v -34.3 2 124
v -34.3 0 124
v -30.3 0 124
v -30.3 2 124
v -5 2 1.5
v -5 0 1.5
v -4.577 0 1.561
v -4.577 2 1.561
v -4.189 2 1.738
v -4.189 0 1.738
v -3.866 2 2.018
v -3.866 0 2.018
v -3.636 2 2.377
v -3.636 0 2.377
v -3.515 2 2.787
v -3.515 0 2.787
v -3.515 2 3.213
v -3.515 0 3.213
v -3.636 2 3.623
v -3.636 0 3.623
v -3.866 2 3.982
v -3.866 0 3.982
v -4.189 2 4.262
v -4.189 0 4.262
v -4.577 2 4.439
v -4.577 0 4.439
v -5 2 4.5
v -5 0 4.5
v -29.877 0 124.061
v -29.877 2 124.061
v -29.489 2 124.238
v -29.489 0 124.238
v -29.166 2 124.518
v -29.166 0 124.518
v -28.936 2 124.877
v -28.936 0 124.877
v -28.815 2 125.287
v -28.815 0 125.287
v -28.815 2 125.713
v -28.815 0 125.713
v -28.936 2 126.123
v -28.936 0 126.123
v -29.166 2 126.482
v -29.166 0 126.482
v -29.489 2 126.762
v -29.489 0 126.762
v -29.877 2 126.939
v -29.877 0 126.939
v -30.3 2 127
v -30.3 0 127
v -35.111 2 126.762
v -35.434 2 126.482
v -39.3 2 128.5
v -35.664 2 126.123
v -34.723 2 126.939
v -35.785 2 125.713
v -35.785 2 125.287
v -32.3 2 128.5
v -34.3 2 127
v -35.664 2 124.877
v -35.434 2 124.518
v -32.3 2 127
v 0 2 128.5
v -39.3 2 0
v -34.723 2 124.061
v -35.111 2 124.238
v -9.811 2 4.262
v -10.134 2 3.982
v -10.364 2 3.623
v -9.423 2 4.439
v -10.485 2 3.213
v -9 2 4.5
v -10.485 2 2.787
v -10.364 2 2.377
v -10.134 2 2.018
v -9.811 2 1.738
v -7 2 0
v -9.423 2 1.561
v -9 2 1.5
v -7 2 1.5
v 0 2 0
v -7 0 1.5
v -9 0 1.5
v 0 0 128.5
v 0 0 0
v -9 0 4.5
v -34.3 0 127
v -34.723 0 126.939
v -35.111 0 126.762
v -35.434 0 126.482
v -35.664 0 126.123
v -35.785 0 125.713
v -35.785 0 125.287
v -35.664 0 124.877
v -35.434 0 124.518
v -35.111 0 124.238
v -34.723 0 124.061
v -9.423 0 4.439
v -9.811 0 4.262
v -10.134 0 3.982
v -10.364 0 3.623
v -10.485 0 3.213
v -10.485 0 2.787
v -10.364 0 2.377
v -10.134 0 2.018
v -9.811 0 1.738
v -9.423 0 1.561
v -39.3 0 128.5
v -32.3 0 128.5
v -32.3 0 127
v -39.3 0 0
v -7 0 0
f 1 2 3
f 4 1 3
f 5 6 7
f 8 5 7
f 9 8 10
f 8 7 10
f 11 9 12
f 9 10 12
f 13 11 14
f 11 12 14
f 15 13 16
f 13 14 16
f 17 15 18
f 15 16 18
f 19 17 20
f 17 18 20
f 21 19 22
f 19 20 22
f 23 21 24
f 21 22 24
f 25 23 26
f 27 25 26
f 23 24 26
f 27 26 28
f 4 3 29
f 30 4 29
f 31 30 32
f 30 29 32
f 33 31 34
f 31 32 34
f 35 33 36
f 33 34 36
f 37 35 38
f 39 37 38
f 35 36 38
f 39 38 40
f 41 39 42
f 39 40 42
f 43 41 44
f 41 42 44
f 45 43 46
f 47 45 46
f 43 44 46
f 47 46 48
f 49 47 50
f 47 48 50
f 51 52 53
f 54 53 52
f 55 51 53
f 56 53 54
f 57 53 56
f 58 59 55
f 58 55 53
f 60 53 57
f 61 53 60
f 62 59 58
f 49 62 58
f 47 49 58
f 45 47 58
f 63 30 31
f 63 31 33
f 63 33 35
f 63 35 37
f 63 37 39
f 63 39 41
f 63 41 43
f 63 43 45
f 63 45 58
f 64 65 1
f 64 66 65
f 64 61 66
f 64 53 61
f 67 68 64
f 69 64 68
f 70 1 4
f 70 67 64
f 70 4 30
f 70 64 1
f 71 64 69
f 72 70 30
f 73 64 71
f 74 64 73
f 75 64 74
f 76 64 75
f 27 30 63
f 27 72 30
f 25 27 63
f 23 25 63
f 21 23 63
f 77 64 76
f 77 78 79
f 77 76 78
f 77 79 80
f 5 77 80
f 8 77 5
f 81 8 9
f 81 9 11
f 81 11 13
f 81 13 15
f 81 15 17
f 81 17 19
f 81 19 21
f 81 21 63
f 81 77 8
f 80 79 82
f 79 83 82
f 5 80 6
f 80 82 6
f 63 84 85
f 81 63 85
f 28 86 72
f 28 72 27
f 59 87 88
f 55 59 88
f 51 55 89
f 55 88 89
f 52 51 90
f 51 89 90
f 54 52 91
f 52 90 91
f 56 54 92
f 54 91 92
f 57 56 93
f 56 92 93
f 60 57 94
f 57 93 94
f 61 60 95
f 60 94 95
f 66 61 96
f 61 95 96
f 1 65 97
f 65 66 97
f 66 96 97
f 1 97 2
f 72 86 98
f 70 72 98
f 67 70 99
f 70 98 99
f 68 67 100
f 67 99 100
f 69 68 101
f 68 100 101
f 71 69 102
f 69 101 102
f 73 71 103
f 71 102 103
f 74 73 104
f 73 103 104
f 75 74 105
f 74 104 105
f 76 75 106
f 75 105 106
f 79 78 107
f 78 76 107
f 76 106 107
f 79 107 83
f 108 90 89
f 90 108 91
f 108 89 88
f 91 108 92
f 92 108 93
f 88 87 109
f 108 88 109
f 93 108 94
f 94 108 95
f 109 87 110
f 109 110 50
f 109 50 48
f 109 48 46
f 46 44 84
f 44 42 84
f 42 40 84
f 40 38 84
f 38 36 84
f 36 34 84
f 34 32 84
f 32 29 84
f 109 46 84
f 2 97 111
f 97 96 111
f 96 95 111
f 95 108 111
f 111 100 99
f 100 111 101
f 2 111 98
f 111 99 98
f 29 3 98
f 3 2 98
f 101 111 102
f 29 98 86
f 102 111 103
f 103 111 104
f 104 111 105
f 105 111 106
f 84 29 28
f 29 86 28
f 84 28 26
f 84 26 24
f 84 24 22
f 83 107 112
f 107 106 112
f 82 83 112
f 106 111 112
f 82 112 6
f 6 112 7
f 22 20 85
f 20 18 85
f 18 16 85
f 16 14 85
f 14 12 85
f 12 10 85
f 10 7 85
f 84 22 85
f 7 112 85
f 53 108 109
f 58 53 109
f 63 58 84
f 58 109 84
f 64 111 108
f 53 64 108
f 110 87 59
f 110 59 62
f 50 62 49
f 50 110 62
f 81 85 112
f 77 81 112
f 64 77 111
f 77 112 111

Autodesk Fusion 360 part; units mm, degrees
sketch "Skizze1" plane through (0, 0, 0) normal (0, 1, 0) x (1, 0, 0)
  line L0 (0, 0) -> (-39.3, 0)
  line L1 (-39.3, 0) -> (-39.3, -128.5)
  line L2 (-39.3, -128.5) -> (0, -128.5)
  line L3 (0, -128.5) -> (0, 0)
  line L4 (0, 0) -> (-7, 0)
  line L5 (-7, 0) -> (-7, -3)
  line L6 (-39.3, -128.5) -> (-32.3, -128.5)
  line L7 (-32.3, -128.5) -> (-32.3, -125.5)
  line L8 (-7, -3) -> (-9, -3)
  line L9 (-7, -3) -> (-5, -3)
  circle A0 centre (-5, -3) radius 1.5
  circle A1 centre (-9, -3) radius 1.5
  line L10 (-9, -3) -> (-9, -1.5)
  line L11 (-9, -1.5) -> (-5, -1.5)
  line L12 (-9, -4.5) -> (-5, -4.5)
  line L13 (-32.3, -125.5) -> (-34.3, -125.5)
  line L14 (-32.3, -125.5) -> (-30.3, -125.5)
  circle A2 centre (-34.3, -125.5) radius 1.5
  circle A3 centre (-30.3, -125.5) radius 1.5
  line L15 (-34.3, -125.5) -> (-34.3, -124)
  line L16 (-30.3, -125.5) -> (-30.3, -124)
  line L17 (-34.3, -124) -> (-30.3, -124)
  line L18 (-34.3, -125.5) -> (-34.3, -127)
  line L19 (-34.3, -127) -> (-30.3, -127)
  line L20 (0, -128.5) -> (-10, -128.5)
  line L21 (-10, -128.5) -> (-10, -16.5842)
  circle A4 centre (-10, -97.2748) radius 3.5
  line L22 (-10, -97.2748) -> (-10, -76.7748)
  circle A5 centre (-10, -76.7748) radius 3.5
  line L23 (-10, -76.7748) -> (-21.5, -76.7748)
  line L24 (-21.5, -76.7748) -> (-21.5, -39.6569)
  line L25 (-21.5, -76.7748) -> (-21.5, -50.7748)
  line L26 (-21.5, -50.7748) -> (-17.1, -50.7748)
  circle A6 centre (-17.1, -50.7748) radius 3.25
  line L27 (-39.3, 0) -> (-39.3, -25)
  line L28 (-39.3, -25) -> (0, -25)
  line L29 (0, -25) -> (-19.65, -25)
  circle A7 centre (-9.825, -25) radius 3.25
  line L30 (-19.65, -25) -> (-39.3, -25)
  circle A8 centre (-29.475, -25) radius 3.25
  dimension "d1" = 39.3
  dimension "d2" = 128.5
  dimension "d3" = 7
  dimension "d4" = 3
  dimension "d5" = 7
  dimension "d6" = 3
  dimension "d7" = 2
  dimension "d8" = 2
  dimension "d9" = 3
  dimension "d10" = 3
  dimension "d11" = 2
  dimension "d12" = 2
  dimension "d13" = 3
  dimension "d14" = 3
  dimension "d15" = 10
  dimension "d16" = 7
  dimension "d17" = 20.5
  dimension "d18" = 7
  dimension "d19" = 11.5
  dimension "d20" = 26
  dimension "d21" = 4.4
  dimension "d22" = 6.5
  dimension "d23" = 25
  dimension "d24" = 6.5
  dimension "d25" = 6.5
extrude "Extrusion1" add sketch "Skizze1" along normal blind 2 contours L0 L1 L3 L4 L27 L28 L29 A7 L30 A8 | L2 L3 L20 L21 A4 L22 A5 L28 L29 A7 | L1 L2 L6 L21 A4 L22 A5 L28 L29 A7 L30 A8
sketch "Skizze2" plane through (0, 2, 0) normal (0, 1, 0) x (-1, 0, 0)
  circle A0 centre (9.825, 25) radius 3.25
  arc A1 (9, 1.5) -> (9, 4.5) centre (9, 3) ccw
  line L0 (9, 1.5) -> (5, 1.5)
  arc A2 (5, 4.5) -> (5, 1.5) centre (5, 3) ccw
  line L1 (5, 4.5) -> (9, 4.5)
  arc A3 (34.3, 124) -> (34.3, 127) centre (34.3, 125.5) ccw
  line L2 (34.3, 124) -> (30.3, 124)
  arc A4 (30.3, 127) -> (30.3, 124) centre (30.3, 125.5) ccw
  line L3 (30.3, 127) -> (34.3, 127)
  circle A5 centre (10, 76.7748) radius 3.5
  circle A6 centre (10, 97.2748) radius 3.5
  circle A7 centre (17.1, 50.7748) radius 3.25
  circle A8 centre (29.475, 25) radius 3.25
  line L4 (0, 128.5) -> (0, 0)
  line L5 (0, 0) -> (39.3, 0)
  line L6 (39.3, 0) -> (39.3, 128.5)
  line L7 (39.3, 128.5) -> (0, 128.5)
extrude "Extrusion2" add sketch "Skizze2" against normal blind 2 contours A0 | A5 | A6 | A7 | A8
